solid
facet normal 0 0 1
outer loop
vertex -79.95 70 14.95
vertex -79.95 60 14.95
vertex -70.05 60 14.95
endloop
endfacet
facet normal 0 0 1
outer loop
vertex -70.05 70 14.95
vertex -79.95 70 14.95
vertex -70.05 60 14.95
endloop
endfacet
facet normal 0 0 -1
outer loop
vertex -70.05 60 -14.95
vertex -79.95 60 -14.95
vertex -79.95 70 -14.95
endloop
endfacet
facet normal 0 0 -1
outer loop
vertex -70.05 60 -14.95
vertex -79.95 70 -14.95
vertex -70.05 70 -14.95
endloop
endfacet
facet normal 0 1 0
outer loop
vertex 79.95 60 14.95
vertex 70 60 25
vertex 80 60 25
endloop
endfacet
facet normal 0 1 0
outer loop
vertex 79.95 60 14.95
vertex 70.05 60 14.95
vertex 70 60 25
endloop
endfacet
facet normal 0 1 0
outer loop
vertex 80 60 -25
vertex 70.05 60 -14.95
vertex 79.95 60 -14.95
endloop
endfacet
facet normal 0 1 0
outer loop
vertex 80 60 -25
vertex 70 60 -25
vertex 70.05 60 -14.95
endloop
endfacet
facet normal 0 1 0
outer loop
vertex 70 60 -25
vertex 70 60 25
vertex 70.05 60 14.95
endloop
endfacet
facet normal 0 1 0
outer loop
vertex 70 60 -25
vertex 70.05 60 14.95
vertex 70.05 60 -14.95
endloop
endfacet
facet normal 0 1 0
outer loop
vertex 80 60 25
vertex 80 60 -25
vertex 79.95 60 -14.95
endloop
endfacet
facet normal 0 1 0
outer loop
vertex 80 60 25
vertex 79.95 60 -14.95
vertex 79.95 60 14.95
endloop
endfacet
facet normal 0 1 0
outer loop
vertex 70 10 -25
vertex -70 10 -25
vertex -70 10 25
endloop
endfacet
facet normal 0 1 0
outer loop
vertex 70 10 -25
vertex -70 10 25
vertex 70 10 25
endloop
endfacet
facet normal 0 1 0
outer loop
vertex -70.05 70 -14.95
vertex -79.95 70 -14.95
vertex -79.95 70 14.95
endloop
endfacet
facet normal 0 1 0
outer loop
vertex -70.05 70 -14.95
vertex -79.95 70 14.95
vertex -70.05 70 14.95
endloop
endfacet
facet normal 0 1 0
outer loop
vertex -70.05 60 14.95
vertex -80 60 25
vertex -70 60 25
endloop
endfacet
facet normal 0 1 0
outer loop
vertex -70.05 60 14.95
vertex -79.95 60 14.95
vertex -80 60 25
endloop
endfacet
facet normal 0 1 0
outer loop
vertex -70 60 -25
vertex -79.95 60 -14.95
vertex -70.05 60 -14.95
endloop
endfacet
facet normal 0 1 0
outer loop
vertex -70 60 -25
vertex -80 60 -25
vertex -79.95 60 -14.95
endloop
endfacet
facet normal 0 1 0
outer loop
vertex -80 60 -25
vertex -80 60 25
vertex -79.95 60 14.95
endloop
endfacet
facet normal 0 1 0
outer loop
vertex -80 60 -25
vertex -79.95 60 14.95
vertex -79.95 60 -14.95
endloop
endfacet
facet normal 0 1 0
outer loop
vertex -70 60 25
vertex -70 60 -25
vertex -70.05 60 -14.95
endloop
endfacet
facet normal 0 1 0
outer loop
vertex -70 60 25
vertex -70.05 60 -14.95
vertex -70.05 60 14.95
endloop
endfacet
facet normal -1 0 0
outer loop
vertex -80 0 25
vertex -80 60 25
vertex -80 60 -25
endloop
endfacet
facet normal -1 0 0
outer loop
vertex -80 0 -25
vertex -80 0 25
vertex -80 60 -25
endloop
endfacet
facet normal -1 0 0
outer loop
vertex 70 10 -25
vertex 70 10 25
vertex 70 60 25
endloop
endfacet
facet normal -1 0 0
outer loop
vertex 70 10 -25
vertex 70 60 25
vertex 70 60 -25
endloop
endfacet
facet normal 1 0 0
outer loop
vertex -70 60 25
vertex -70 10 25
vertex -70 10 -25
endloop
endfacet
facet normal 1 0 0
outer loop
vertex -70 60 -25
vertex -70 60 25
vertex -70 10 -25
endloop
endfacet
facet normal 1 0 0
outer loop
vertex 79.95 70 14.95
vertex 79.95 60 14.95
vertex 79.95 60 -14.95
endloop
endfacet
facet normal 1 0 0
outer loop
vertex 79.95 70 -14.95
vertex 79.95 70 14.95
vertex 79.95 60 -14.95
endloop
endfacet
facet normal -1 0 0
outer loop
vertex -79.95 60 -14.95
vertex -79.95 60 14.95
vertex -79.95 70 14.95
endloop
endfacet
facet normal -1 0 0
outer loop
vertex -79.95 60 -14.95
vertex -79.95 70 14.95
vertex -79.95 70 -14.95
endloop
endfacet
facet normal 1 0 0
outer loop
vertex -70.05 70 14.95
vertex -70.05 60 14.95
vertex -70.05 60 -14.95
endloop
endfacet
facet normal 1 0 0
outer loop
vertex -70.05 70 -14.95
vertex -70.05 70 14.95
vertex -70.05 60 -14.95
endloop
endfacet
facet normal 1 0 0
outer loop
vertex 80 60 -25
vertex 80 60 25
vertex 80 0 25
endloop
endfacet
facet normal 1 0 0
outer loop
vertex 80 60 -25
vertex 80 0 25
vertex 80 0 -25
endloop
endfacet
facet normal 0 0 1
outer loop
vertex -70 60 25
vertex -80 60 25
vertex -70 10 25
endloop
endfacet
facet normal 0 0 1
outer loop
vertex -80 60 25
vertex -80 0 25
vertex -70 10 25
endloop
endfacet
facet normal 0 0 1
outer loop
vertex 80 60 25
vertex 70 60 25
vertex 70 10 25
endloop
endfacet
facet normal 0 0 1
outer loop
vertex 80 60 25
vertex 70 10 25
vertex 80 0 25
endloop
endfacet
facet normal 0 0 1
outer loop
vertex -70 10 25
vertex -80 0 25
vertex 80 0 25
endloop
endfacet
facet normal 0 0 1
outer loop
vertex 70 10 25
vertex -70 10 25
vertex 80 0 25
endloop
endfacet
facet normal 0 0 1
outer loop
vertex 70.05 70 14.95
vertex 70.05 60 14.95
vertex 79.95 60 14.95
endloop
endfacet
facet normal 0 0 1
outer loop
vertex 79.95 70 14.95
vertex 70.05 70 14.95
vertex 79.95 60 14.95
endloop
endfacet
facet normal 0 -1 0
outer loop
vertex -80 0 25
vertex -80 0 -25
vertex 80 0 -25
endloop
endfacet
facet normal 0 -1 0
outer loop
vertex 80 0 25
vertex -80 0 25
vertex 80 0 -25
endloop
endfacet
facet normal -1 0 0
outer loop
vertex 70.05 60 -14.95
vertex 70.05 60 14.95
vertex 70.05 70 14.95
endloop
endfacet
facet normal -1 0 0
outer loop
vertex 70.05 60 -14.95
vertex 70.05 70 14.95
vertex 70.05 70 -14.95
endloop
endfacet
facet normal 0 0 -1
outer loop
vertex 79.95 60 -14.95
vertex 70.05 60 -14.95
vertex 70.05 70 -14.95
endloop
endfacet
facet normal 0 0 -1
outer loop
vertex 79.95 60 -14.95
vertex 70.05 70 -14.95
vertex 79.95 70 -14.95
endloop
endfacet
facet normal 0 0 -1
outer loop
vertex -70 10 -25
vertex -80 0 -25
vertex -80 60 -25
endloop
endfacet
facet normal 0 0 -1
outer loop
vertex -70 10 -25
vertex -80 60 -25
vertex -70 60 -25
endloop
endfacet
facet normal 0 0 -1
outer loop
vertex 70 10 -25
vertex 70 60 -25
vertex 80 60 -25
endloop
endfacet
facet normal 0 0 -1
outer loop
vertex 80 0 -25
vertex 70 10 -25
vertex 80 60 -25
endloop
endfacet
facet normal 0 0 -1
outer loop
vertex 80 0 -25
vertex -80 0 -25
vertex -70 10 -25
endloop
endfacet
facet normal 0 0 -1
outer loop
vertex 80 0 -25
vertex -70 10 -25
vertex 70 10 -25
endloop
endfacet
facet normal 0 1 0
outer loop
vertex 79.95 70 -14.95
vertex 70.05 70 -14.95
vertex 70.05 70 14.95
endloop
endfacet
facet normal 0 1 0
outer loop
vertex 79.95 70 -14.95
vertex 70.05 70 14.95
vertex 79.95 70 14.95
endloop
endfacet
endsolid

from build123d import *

# Parameters (mm, degrees)
SKETCH1_W           = 160
SKETCH1_H           = 50
BOSS_EXTRUDE1_DEPTH = 10
SKETCH2_W           = 10
SKETCH2_H           = 50
BOSS_EXTRUDE2_DEPTH = 50
SKETCH3_W           = 9.9
SKETCH3_H           = 29.9
BOSS_EXTRUDE3_DEPTH = 10


with BuildPart() as part:
    # Sketch1 → Boss-Extrude1 (new body)
    with BuildSketch(Plane(origin=(0, 0, 0), x_dir=(1, 0, 0), z_dir=(0, 1, 0))):
        Rectangle(SKETCH1_W, SKETCH1_H)
    extrude(amount=BOSS_EXTRUDE1_DEPTH)

    # Sketch2 → Boss-Extrude2 (add)
    with BuildSketch(Plane(origin=(0, 10, 0), x_dir=(1, 0, 0), z_dir=(0, 1, 0))):
        with Locations((-75, 0)):
            Rectangle(SKETCH2_W, SKETCH2_H)
        with Locations((75, 0)):
            Rectangle(SKETCH2_W, SKETCH2_H)
    extrude(amount=BOSS_EXTRUDE2_DEPTH)

    # Sketch3 → Boss-Extrude3 (add)
    with BuildSketch(Plane(origin=(0, 60, 0), x_dir=(1, 0, 0), z_dir=(0, 1, 0))):
        with Locations((-75, 0)):
            Rectangle(SKETCH3_W, SKETCH3_H)
        with Locations((75, 0)):
            Rectangle(SKETCH3_W, SKETCH3_H)
    extrude(amount=BOSS_EXTRUDE3_DEPTH)


solid = part.part
